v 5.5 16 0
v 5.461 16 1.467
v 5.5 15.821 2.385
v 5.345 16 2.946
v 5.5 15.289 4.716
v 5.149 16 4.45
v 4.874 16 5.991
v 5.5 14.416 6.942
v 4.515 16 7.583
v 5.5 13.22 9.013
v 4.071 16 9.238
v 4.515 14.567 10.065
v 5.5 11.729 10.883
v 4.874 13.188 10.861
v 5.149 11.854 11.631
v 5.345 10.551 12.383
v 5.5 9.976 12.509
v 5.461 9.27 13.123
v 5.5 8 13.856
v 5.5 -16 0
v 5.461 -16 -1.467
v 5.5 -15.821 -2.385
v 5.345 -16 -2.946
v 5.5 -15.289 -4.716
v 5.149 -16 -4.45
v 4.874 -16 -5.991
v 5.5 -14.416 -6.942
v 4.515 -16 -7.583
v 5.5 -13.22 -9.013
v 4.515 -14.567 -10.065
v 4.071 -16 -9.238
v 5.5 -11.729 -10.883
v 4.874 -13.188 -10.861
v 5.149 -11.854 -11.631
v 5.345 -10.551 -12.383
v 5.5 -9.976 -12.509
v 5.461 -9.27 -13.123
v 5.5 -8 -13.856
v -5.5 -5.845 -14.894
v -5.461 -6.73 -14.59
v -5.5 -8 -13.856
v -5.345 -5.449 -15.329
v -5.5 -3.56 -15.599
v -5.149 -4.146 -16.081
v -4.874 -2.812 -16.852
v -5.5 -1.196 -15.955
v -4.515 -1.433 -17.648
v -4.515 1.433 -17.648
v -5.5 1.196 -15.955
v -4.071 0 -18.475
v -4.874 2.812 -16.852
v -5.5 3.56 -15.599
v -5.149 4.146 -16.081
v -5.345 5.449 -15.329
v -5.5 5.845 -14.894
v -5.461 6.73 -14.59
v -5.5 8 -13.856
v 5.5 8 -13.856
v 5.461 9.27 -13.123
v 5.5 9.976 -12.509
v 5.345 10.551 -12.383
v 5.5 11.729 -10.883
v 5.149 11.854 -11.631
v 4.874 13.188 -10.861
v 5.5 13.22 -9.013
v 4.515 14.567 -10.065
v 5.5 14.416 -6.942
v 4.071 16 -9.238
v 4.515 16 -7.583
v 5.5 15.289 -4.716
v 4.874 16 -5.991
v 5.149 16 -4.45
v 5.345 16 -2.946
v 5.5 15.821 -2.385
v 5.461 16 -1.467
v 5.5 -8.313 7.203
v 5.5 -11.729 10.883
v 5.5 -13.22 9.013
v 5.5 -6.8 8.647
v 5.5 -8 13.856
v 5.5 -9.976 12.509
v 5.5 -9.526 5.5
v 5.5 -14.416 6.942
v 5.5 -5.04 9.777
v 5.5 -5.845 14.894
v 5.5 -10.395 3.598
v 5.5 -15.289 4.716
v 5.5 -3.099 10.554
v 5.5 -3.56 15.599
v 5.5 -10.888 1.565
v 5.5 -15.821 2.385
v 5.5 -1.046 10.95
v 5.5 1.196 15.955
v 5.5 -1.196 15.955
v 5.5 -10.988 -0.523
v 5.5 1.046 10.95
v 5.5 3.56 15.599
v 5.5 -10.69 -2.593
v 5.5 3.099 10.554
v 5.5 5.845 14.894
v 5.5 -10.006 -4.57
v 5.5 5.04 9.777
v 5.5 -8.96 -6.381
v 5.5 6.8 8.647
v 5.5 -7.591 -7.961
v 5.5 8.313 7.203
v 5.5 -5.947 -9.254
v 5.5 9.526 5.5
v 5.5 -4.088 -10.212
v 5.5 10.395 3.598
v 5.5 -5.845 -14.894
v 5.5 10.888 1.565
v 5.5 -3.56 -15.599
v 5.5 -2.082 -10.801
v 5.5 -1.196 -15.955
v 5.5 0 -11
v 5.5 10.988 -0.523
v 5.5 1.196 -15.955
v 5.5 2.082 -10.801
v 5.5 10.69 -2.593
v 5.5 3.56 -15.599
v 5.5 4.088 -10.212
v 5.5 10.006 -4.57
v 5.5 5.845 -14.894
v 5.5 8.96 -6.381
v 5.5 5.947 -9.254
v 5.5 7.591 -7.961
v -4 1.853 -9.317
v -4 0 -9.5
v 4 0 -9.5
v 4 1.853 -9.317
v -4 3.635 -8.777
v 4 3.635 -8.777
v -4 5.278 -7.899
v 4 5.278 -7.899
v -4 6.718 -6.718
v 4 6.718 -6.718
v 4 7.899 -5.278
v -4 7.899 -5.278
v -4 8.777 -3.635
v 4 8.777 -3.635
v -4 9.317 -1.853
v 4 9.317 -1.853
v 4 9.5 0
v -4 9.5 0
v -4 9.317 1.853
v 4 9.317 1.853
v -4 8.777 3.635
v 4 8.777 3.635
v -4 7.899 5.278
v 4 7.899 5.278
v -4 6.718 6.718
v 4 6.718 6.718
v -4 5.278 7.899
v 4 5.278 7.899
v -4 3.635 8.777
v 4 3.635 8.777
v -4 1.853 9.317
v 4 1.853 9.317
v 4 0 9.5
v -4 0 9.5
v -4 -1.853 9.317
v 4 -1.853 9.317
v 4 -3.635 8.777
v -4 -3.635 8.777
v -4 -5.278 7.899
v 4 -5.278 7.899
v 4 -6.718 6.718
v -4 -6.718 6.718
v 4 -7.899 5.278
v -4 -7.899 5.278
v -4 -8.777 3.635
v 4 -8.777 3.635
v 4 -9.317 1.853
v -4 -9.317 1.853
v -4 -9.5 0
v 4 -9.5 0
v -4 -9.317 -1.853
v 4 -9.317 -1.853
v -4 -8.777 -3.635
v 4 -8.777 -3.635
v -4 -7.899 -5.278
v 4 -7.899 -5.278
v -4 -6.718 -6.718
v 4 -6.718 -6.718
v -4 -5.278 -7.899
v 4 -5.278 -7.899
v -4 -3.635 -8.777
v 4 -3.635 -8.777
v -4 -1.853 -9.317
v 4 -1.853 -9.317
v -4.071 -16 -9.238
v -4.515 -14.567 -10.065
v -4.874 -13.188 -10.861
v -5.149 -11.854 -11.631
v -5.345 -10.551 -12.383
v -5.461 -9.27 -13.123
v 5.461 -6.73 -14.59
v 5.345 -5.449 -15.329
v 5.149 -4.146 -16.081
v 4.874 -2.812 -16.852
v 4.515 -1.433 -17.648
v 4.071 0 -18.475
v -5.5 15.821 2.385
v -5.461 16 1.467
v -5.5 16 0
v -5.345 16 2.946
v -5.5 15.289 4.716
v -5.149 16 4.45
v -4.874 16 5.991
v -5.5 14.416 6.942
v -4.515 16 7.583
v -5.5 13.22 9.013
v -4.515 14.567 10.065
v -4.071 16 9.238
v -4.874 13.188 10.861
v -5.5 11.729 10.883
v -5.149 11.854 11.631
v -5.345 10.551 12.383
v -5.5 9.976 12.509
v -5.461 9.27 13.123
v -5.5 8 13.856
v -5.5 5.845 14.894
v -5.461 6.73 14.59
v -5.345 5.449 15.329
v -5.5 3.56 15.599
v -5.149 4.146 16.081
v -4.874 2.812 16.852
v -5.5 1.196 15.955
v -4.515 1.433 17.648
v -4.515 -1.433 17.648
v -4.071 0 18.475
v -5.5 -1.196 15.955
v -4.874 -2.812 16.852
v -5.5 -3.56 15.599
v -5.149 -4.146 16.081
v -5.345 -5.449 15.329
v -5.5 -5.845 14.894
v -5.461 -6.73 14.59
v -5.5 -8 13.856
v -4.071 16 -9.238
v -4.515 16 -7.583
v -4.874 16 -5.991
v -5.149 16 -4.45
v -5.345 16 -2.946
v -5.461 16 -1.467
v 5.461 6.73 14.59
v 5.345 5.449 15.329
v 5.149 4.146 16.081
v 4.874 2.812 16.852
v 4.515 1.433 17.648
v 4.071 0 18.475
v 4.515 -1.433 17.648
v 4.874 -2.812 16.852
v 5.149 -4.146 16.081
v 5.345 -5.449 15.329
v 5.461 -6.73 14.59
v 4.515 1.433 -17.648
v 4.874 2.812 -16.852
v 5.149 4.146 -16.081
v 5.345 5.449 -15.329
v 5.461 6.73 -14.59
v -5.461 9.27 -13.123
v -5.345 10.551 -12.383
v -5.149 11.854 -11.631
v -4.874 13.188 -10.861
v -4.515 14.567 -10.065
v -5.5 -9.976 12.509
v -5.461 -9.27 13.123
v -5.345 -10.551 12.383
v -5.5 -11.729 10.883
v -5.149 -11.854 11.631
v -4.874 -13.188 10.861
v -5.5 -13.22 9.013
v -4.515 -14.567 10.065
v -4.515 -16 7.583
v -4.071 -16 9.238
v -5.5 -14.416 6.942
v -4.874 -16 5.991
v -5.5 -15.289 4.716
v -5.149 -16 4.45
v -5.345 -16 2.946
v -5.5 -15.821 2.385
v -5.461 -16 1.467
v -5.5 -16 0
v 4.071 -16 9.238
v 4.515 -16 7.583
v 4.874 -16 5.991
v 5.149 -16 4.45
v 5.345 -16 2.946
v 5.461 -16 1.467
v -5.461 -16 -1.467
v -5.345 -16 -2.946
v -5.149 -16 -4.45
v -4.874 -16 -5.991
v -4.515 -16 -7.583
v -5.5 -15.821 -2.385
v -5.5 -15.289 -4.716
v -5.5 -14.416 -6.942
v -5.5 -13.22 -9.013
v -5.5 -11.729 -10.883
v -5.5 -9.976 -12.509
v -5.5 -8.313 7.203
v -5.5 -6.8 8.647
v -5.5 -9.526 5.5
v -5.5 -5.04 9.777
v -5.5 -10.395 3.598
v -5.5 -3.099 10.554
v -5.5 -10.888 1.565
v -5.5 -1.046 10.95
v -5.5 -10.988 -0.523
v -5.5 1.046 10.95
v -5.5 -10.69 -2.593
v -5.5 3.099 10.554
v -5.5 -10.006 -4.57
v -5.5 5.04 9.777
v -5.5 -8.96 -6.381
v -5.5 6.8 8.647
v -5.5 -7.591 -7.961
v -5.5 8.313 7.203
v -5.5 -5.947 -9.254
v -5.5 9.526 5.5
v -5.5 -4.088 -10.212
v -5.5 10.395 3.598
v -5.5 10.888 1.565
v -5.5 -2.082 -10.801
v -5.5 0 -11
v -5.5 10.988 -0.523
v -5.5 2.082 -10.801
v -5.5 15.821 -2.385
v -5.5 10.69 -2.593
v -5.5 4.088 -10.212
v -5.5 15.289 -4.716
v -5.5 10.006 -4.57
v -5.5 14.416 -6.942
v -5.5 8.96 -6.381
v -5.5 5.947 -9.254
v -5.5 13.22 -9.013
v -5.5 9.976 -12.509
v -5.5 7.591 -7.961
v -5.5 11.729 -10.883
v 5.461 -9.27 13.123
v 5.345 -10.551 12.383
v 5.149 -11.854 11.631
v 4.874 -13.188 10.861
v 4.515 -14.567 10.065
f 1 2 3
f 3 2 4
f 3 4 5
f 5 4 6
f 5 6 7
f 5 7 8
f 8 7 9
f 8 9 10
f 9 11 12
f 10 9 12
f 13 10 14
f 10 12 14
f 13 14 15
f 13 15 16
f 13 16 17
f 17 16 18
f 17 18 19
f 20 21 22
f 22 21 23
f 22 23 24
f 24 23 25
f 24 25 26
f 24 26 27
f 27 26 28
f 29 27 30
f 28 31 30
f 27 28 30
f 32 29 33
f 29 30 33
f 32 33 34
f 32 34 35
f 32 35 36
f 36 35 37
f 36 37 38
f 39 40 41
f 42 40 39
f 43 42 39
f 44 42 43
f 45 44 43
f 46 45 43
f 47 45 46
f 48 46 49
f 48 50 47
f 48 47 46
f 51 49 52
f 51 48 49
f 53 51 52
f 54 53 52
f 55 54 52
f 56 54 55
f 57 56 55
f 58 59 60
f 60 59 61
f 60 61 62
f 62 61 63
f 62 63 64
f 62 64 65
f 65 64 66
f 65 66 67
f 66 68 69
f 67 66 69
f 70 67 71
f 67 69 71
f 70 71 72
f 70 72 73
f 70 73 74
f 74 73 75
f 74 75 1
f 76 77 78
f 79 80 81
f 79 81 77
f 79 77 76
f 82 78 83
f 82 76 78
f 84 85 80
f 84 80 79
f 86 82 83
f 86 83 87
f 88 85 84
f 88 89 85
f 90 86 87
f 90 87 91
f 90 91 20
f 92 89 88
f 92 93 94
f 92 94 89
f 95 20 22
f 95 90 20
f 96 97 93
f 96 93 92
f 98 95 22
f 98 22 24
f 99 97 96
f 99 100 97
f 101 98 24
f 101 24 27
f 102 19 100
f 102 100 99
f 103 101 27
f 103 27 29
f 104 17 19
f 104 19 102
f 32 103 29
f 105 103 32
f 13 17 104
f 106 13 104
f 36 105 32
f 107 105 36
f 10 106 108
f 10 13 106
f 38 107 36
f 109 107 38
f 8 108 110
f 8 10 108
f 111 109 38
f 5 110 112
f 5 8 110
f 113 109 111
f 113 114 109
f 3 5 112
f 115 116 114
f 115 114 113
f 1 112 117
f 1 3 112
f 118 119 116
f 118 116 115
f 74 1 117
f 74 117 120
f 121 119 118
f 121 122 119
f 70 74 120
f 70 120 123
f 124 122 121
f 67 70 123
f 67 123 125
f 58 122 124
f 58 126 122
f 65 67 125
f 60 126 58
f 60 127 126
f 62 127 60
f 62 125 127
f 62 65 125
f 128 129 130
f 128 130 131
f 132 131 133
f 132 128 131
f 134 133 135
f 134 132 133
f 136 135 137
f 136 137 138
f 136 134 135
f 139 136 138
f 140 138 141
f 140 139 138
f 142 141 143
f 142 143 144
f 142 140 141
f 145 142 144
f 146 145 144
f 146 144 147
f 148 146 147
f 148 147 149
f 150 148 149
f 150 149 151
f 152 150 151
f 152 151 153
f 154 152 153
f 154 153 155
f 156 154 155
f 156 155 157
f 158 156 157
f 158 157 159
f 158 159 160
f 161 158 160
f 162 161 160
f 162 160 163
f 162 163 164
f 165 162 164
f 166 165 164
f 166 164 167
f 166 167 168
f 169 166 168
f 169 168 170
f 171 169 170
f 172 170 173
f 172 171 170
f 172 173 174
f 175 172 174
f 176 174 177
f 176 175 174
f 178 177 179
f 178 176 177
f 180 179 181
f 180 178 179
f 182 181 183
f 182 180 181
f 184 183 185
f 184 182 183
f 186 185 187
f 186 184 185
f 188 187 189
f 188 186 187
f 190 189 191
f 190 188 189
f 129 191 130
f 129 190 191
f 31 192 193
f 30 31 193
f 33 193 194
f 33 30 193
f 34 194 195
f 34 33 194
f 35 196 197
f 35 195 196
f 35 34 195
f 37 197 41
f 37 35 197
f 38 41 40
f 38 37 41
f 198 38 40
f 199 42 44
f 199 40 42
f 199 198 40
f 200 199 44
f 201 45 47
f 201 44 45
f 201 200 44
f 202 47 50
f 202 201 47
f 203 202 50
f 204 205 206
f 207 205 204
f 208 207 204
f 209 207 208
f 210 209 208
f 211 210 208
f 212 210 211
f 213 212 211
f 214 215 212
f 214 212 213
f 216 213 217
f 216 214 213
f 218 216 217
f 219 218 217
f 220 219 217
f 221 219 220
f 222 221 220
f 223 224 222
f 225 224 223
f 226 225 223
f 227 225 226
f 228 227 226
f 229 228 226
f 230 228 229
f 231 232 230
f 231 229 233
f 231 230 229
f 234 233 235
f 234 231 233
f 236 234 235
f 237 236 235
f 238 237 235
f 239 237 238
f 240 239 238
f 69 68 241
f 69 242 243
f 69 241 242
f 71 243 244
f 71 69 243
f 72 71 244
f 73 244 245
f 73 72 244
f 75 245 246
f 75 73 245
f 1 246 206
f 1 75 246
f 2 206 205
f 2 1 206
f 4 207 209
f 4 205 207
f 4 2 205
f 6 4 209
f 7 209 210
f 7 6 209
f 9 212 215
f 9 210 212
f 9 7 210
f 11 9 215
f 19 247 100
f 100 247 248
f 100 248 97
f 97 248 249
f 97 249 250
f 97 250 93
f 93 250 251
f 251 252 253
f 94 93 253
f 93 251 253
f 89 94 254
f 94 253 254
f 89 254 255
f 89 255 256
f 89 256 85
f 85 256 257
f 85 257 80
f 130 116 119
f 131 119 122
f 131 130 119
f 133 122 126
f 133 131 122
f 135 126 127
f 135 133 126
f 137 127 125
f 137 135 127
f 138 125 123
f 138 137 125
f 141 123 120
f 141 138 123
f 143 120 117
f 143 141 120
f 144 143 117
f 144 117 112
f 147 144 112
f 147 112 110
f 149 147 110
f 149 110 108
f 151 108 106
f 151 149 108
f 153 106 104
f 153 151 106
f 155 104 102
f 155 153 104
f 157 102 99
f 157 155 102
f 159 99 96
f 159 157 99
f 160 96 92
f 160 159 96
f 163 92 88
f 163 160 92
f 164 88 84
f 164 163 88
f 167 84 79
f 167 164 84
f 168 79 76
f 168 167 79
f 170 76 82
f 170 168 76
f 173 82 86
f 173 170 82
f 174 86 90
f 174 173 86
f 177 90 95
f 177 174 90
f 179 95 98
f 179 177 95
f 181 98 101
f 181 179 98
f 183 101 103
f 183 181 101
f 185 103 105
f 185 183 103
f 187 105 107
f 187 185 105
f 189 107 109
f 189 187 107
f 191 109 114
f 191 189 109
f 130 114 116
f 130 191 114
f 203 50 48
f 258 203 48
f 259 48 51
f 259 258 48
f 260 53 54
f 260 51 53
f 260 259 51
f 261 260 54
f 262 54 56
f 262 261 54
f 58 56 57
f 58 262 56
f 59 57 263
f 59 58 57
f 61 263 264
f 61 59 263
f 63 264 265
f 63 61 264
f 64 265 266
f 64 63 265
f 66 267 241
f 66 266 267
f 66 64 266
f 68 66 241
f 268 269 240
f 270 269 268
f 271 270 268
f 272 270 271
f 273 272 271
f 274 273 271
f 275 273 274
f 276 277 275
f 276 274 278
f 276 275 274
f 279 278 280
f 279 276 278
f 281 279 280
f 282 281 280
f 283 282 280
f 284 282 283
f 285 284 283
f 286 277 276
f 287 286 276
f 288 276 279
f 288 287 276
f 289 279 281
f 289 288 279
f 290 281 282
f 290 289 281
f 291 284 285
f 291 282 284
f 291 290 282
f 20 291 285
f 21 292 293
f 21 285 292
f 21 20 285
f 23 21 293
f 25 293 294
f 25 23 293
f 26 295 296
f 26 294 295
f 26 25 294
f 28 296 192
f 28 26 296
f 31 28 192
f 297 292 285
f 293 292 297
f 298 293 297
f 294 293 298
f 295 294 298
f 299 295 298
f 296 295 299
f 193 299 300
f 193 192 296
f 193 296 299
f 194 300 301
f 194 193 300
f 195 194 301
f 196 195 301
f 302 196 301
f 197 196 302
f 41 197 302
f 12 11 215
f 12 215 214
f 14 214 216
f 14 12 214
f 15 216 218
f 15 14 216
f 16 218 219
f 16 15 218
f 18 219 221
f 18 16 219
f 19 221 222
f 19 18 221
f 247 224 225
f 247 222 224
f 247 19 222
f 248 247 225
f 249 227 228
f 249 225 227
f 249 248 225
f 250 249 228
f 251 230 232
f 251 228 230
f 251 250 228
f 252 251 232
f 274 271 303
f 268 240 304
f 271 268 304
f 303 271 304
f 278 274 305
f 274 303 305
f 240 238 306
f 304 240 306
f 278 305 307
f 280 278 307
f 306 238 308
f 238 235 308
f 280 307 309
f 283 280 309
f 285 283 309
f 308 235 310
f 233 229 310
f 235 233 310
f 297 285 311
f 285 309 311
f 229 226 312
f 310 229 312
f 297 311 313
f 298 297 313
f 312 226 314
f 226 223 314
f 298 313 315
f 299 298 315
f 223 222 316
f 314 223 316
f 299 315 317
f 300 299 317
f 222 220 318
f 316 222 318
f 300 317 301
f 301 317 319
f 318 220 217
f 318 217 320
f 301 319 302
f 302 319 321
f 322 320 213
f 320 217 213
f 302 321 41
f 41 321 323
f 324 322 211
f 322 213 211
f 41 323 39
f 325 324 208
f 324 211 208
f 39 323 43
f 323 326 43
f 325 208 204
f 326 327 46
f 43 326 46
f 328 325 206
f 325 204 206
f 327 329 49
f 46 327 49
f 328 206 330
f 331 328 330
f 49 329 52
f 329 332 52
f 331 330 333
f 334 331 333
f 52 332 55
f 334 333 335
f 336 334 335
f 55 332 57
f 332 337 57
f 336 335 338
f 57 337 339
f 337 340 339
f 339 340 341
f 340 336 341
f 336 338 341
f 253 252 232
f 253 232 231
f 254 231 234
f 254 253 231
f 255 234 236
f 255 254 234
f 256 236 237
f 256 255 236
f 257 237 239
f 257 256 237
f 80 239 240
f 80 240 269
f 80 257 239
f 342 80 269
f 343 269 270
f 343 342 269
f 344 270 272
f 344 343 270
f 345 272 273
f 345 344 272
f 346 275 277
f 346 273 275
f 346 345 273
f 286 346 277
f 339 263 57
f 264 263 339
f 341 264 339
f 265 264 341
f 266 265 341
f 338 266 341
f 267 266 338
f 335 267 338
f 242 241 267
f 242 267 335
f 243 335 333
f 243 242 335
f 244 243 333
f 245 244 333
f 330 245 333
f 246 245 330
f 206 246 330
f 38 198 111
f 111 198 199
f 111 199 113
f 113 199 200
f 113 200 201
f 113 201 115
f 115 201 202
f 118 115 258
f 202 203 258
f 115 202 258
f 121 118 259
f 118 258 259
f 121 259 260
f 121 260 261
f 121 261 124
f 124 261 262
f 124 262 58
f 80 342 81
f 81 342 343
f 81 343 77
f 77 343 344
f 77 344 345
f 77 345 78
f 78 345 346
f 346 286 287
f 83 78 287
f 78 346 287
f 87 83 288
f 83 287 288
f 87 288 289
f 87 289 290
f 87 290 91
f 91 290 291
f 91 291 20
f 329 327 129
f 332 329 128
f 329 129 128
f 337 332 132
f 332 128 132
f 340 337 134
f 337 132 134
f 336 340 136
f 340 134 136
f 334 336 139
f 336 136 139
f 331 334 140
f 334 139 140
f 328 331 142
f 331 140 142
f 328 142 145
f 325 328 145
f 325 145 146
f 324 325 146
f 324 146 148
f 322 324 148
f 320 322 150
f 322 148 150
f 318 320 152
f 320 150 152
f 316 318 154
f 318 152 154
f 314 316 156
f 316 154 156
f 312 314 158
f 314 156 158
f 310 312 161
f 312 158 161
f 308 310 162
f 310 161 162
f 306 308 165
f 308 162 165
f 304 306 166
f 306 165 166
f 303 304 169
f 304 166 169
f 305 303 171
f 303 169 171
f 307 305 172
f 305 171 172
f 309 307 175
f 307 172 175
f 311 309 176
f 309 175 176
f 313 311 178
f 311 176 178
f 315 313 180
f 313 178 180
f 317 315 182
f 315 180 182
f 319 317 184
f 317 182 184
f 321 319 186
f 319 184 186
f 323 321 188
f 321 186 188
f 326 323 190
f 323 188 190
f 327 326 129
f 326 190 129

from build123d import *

# Parameters (mm, degrees)
SKETCH1_R      = 9.5
EXTRUDE1_DEPTH = 5.5
SMUSSO1_SIZE   = 1.5


# Read off the part's stored shape, not the designer's step: Cut-Extrude1
with BuildPart() as part:
    # Sketch1 → Extrude1 (new, symmetric)
    with BuildSketch(Plane(origin=(0, 0, 0), x_dir=(0, 0, -1), z_dir=(1, 0, 0))):
        Polygon((18.475208614, 0), (9.237604307, 16), (-9.237604307, 16), (-18.475208614, 0), (-9.237604307, -16), (9.237604307, -16), align=None)
        Circle(SKETCH1_R, mode=Mode.SUBTRACT)
    extrude(amount=EXTRUDE1_DEPTH, both=True)

    # Cut-Extrude1 outline → Cut-Extrude1 (revolve, cut)
    with BuildSketch(Plane.YX):
        Polygon((18.475208616, 5.500000004), (15.999999996, 5.500000004), (18.475208616, 4.070937639), align=None)
    cut_extrude1 = revolve(axis=Axis((0, 0, 0), (1, 0, 0)), mode=Mode.SUBTRACT)

    # Mirror1: Cut-Extrude1 across plane
    add(cut_extrude1.mirror(Plane(origin=(0, 0, 0), x_dir=(0, 0, 1), z_dir=(1, 0, 0))), mode=Mode.SUBTRACT)

    # Smusso1
    smusso1_edges = [part.edges().sort_by_distance(p)[0] for p in [
        (-5.5, 0, 9.5),
        (5.5, 0, 9.5),
    ]]
    chamfer(smusso1_edges, length=SMUSSO1_SIZE)


solid = part.part
